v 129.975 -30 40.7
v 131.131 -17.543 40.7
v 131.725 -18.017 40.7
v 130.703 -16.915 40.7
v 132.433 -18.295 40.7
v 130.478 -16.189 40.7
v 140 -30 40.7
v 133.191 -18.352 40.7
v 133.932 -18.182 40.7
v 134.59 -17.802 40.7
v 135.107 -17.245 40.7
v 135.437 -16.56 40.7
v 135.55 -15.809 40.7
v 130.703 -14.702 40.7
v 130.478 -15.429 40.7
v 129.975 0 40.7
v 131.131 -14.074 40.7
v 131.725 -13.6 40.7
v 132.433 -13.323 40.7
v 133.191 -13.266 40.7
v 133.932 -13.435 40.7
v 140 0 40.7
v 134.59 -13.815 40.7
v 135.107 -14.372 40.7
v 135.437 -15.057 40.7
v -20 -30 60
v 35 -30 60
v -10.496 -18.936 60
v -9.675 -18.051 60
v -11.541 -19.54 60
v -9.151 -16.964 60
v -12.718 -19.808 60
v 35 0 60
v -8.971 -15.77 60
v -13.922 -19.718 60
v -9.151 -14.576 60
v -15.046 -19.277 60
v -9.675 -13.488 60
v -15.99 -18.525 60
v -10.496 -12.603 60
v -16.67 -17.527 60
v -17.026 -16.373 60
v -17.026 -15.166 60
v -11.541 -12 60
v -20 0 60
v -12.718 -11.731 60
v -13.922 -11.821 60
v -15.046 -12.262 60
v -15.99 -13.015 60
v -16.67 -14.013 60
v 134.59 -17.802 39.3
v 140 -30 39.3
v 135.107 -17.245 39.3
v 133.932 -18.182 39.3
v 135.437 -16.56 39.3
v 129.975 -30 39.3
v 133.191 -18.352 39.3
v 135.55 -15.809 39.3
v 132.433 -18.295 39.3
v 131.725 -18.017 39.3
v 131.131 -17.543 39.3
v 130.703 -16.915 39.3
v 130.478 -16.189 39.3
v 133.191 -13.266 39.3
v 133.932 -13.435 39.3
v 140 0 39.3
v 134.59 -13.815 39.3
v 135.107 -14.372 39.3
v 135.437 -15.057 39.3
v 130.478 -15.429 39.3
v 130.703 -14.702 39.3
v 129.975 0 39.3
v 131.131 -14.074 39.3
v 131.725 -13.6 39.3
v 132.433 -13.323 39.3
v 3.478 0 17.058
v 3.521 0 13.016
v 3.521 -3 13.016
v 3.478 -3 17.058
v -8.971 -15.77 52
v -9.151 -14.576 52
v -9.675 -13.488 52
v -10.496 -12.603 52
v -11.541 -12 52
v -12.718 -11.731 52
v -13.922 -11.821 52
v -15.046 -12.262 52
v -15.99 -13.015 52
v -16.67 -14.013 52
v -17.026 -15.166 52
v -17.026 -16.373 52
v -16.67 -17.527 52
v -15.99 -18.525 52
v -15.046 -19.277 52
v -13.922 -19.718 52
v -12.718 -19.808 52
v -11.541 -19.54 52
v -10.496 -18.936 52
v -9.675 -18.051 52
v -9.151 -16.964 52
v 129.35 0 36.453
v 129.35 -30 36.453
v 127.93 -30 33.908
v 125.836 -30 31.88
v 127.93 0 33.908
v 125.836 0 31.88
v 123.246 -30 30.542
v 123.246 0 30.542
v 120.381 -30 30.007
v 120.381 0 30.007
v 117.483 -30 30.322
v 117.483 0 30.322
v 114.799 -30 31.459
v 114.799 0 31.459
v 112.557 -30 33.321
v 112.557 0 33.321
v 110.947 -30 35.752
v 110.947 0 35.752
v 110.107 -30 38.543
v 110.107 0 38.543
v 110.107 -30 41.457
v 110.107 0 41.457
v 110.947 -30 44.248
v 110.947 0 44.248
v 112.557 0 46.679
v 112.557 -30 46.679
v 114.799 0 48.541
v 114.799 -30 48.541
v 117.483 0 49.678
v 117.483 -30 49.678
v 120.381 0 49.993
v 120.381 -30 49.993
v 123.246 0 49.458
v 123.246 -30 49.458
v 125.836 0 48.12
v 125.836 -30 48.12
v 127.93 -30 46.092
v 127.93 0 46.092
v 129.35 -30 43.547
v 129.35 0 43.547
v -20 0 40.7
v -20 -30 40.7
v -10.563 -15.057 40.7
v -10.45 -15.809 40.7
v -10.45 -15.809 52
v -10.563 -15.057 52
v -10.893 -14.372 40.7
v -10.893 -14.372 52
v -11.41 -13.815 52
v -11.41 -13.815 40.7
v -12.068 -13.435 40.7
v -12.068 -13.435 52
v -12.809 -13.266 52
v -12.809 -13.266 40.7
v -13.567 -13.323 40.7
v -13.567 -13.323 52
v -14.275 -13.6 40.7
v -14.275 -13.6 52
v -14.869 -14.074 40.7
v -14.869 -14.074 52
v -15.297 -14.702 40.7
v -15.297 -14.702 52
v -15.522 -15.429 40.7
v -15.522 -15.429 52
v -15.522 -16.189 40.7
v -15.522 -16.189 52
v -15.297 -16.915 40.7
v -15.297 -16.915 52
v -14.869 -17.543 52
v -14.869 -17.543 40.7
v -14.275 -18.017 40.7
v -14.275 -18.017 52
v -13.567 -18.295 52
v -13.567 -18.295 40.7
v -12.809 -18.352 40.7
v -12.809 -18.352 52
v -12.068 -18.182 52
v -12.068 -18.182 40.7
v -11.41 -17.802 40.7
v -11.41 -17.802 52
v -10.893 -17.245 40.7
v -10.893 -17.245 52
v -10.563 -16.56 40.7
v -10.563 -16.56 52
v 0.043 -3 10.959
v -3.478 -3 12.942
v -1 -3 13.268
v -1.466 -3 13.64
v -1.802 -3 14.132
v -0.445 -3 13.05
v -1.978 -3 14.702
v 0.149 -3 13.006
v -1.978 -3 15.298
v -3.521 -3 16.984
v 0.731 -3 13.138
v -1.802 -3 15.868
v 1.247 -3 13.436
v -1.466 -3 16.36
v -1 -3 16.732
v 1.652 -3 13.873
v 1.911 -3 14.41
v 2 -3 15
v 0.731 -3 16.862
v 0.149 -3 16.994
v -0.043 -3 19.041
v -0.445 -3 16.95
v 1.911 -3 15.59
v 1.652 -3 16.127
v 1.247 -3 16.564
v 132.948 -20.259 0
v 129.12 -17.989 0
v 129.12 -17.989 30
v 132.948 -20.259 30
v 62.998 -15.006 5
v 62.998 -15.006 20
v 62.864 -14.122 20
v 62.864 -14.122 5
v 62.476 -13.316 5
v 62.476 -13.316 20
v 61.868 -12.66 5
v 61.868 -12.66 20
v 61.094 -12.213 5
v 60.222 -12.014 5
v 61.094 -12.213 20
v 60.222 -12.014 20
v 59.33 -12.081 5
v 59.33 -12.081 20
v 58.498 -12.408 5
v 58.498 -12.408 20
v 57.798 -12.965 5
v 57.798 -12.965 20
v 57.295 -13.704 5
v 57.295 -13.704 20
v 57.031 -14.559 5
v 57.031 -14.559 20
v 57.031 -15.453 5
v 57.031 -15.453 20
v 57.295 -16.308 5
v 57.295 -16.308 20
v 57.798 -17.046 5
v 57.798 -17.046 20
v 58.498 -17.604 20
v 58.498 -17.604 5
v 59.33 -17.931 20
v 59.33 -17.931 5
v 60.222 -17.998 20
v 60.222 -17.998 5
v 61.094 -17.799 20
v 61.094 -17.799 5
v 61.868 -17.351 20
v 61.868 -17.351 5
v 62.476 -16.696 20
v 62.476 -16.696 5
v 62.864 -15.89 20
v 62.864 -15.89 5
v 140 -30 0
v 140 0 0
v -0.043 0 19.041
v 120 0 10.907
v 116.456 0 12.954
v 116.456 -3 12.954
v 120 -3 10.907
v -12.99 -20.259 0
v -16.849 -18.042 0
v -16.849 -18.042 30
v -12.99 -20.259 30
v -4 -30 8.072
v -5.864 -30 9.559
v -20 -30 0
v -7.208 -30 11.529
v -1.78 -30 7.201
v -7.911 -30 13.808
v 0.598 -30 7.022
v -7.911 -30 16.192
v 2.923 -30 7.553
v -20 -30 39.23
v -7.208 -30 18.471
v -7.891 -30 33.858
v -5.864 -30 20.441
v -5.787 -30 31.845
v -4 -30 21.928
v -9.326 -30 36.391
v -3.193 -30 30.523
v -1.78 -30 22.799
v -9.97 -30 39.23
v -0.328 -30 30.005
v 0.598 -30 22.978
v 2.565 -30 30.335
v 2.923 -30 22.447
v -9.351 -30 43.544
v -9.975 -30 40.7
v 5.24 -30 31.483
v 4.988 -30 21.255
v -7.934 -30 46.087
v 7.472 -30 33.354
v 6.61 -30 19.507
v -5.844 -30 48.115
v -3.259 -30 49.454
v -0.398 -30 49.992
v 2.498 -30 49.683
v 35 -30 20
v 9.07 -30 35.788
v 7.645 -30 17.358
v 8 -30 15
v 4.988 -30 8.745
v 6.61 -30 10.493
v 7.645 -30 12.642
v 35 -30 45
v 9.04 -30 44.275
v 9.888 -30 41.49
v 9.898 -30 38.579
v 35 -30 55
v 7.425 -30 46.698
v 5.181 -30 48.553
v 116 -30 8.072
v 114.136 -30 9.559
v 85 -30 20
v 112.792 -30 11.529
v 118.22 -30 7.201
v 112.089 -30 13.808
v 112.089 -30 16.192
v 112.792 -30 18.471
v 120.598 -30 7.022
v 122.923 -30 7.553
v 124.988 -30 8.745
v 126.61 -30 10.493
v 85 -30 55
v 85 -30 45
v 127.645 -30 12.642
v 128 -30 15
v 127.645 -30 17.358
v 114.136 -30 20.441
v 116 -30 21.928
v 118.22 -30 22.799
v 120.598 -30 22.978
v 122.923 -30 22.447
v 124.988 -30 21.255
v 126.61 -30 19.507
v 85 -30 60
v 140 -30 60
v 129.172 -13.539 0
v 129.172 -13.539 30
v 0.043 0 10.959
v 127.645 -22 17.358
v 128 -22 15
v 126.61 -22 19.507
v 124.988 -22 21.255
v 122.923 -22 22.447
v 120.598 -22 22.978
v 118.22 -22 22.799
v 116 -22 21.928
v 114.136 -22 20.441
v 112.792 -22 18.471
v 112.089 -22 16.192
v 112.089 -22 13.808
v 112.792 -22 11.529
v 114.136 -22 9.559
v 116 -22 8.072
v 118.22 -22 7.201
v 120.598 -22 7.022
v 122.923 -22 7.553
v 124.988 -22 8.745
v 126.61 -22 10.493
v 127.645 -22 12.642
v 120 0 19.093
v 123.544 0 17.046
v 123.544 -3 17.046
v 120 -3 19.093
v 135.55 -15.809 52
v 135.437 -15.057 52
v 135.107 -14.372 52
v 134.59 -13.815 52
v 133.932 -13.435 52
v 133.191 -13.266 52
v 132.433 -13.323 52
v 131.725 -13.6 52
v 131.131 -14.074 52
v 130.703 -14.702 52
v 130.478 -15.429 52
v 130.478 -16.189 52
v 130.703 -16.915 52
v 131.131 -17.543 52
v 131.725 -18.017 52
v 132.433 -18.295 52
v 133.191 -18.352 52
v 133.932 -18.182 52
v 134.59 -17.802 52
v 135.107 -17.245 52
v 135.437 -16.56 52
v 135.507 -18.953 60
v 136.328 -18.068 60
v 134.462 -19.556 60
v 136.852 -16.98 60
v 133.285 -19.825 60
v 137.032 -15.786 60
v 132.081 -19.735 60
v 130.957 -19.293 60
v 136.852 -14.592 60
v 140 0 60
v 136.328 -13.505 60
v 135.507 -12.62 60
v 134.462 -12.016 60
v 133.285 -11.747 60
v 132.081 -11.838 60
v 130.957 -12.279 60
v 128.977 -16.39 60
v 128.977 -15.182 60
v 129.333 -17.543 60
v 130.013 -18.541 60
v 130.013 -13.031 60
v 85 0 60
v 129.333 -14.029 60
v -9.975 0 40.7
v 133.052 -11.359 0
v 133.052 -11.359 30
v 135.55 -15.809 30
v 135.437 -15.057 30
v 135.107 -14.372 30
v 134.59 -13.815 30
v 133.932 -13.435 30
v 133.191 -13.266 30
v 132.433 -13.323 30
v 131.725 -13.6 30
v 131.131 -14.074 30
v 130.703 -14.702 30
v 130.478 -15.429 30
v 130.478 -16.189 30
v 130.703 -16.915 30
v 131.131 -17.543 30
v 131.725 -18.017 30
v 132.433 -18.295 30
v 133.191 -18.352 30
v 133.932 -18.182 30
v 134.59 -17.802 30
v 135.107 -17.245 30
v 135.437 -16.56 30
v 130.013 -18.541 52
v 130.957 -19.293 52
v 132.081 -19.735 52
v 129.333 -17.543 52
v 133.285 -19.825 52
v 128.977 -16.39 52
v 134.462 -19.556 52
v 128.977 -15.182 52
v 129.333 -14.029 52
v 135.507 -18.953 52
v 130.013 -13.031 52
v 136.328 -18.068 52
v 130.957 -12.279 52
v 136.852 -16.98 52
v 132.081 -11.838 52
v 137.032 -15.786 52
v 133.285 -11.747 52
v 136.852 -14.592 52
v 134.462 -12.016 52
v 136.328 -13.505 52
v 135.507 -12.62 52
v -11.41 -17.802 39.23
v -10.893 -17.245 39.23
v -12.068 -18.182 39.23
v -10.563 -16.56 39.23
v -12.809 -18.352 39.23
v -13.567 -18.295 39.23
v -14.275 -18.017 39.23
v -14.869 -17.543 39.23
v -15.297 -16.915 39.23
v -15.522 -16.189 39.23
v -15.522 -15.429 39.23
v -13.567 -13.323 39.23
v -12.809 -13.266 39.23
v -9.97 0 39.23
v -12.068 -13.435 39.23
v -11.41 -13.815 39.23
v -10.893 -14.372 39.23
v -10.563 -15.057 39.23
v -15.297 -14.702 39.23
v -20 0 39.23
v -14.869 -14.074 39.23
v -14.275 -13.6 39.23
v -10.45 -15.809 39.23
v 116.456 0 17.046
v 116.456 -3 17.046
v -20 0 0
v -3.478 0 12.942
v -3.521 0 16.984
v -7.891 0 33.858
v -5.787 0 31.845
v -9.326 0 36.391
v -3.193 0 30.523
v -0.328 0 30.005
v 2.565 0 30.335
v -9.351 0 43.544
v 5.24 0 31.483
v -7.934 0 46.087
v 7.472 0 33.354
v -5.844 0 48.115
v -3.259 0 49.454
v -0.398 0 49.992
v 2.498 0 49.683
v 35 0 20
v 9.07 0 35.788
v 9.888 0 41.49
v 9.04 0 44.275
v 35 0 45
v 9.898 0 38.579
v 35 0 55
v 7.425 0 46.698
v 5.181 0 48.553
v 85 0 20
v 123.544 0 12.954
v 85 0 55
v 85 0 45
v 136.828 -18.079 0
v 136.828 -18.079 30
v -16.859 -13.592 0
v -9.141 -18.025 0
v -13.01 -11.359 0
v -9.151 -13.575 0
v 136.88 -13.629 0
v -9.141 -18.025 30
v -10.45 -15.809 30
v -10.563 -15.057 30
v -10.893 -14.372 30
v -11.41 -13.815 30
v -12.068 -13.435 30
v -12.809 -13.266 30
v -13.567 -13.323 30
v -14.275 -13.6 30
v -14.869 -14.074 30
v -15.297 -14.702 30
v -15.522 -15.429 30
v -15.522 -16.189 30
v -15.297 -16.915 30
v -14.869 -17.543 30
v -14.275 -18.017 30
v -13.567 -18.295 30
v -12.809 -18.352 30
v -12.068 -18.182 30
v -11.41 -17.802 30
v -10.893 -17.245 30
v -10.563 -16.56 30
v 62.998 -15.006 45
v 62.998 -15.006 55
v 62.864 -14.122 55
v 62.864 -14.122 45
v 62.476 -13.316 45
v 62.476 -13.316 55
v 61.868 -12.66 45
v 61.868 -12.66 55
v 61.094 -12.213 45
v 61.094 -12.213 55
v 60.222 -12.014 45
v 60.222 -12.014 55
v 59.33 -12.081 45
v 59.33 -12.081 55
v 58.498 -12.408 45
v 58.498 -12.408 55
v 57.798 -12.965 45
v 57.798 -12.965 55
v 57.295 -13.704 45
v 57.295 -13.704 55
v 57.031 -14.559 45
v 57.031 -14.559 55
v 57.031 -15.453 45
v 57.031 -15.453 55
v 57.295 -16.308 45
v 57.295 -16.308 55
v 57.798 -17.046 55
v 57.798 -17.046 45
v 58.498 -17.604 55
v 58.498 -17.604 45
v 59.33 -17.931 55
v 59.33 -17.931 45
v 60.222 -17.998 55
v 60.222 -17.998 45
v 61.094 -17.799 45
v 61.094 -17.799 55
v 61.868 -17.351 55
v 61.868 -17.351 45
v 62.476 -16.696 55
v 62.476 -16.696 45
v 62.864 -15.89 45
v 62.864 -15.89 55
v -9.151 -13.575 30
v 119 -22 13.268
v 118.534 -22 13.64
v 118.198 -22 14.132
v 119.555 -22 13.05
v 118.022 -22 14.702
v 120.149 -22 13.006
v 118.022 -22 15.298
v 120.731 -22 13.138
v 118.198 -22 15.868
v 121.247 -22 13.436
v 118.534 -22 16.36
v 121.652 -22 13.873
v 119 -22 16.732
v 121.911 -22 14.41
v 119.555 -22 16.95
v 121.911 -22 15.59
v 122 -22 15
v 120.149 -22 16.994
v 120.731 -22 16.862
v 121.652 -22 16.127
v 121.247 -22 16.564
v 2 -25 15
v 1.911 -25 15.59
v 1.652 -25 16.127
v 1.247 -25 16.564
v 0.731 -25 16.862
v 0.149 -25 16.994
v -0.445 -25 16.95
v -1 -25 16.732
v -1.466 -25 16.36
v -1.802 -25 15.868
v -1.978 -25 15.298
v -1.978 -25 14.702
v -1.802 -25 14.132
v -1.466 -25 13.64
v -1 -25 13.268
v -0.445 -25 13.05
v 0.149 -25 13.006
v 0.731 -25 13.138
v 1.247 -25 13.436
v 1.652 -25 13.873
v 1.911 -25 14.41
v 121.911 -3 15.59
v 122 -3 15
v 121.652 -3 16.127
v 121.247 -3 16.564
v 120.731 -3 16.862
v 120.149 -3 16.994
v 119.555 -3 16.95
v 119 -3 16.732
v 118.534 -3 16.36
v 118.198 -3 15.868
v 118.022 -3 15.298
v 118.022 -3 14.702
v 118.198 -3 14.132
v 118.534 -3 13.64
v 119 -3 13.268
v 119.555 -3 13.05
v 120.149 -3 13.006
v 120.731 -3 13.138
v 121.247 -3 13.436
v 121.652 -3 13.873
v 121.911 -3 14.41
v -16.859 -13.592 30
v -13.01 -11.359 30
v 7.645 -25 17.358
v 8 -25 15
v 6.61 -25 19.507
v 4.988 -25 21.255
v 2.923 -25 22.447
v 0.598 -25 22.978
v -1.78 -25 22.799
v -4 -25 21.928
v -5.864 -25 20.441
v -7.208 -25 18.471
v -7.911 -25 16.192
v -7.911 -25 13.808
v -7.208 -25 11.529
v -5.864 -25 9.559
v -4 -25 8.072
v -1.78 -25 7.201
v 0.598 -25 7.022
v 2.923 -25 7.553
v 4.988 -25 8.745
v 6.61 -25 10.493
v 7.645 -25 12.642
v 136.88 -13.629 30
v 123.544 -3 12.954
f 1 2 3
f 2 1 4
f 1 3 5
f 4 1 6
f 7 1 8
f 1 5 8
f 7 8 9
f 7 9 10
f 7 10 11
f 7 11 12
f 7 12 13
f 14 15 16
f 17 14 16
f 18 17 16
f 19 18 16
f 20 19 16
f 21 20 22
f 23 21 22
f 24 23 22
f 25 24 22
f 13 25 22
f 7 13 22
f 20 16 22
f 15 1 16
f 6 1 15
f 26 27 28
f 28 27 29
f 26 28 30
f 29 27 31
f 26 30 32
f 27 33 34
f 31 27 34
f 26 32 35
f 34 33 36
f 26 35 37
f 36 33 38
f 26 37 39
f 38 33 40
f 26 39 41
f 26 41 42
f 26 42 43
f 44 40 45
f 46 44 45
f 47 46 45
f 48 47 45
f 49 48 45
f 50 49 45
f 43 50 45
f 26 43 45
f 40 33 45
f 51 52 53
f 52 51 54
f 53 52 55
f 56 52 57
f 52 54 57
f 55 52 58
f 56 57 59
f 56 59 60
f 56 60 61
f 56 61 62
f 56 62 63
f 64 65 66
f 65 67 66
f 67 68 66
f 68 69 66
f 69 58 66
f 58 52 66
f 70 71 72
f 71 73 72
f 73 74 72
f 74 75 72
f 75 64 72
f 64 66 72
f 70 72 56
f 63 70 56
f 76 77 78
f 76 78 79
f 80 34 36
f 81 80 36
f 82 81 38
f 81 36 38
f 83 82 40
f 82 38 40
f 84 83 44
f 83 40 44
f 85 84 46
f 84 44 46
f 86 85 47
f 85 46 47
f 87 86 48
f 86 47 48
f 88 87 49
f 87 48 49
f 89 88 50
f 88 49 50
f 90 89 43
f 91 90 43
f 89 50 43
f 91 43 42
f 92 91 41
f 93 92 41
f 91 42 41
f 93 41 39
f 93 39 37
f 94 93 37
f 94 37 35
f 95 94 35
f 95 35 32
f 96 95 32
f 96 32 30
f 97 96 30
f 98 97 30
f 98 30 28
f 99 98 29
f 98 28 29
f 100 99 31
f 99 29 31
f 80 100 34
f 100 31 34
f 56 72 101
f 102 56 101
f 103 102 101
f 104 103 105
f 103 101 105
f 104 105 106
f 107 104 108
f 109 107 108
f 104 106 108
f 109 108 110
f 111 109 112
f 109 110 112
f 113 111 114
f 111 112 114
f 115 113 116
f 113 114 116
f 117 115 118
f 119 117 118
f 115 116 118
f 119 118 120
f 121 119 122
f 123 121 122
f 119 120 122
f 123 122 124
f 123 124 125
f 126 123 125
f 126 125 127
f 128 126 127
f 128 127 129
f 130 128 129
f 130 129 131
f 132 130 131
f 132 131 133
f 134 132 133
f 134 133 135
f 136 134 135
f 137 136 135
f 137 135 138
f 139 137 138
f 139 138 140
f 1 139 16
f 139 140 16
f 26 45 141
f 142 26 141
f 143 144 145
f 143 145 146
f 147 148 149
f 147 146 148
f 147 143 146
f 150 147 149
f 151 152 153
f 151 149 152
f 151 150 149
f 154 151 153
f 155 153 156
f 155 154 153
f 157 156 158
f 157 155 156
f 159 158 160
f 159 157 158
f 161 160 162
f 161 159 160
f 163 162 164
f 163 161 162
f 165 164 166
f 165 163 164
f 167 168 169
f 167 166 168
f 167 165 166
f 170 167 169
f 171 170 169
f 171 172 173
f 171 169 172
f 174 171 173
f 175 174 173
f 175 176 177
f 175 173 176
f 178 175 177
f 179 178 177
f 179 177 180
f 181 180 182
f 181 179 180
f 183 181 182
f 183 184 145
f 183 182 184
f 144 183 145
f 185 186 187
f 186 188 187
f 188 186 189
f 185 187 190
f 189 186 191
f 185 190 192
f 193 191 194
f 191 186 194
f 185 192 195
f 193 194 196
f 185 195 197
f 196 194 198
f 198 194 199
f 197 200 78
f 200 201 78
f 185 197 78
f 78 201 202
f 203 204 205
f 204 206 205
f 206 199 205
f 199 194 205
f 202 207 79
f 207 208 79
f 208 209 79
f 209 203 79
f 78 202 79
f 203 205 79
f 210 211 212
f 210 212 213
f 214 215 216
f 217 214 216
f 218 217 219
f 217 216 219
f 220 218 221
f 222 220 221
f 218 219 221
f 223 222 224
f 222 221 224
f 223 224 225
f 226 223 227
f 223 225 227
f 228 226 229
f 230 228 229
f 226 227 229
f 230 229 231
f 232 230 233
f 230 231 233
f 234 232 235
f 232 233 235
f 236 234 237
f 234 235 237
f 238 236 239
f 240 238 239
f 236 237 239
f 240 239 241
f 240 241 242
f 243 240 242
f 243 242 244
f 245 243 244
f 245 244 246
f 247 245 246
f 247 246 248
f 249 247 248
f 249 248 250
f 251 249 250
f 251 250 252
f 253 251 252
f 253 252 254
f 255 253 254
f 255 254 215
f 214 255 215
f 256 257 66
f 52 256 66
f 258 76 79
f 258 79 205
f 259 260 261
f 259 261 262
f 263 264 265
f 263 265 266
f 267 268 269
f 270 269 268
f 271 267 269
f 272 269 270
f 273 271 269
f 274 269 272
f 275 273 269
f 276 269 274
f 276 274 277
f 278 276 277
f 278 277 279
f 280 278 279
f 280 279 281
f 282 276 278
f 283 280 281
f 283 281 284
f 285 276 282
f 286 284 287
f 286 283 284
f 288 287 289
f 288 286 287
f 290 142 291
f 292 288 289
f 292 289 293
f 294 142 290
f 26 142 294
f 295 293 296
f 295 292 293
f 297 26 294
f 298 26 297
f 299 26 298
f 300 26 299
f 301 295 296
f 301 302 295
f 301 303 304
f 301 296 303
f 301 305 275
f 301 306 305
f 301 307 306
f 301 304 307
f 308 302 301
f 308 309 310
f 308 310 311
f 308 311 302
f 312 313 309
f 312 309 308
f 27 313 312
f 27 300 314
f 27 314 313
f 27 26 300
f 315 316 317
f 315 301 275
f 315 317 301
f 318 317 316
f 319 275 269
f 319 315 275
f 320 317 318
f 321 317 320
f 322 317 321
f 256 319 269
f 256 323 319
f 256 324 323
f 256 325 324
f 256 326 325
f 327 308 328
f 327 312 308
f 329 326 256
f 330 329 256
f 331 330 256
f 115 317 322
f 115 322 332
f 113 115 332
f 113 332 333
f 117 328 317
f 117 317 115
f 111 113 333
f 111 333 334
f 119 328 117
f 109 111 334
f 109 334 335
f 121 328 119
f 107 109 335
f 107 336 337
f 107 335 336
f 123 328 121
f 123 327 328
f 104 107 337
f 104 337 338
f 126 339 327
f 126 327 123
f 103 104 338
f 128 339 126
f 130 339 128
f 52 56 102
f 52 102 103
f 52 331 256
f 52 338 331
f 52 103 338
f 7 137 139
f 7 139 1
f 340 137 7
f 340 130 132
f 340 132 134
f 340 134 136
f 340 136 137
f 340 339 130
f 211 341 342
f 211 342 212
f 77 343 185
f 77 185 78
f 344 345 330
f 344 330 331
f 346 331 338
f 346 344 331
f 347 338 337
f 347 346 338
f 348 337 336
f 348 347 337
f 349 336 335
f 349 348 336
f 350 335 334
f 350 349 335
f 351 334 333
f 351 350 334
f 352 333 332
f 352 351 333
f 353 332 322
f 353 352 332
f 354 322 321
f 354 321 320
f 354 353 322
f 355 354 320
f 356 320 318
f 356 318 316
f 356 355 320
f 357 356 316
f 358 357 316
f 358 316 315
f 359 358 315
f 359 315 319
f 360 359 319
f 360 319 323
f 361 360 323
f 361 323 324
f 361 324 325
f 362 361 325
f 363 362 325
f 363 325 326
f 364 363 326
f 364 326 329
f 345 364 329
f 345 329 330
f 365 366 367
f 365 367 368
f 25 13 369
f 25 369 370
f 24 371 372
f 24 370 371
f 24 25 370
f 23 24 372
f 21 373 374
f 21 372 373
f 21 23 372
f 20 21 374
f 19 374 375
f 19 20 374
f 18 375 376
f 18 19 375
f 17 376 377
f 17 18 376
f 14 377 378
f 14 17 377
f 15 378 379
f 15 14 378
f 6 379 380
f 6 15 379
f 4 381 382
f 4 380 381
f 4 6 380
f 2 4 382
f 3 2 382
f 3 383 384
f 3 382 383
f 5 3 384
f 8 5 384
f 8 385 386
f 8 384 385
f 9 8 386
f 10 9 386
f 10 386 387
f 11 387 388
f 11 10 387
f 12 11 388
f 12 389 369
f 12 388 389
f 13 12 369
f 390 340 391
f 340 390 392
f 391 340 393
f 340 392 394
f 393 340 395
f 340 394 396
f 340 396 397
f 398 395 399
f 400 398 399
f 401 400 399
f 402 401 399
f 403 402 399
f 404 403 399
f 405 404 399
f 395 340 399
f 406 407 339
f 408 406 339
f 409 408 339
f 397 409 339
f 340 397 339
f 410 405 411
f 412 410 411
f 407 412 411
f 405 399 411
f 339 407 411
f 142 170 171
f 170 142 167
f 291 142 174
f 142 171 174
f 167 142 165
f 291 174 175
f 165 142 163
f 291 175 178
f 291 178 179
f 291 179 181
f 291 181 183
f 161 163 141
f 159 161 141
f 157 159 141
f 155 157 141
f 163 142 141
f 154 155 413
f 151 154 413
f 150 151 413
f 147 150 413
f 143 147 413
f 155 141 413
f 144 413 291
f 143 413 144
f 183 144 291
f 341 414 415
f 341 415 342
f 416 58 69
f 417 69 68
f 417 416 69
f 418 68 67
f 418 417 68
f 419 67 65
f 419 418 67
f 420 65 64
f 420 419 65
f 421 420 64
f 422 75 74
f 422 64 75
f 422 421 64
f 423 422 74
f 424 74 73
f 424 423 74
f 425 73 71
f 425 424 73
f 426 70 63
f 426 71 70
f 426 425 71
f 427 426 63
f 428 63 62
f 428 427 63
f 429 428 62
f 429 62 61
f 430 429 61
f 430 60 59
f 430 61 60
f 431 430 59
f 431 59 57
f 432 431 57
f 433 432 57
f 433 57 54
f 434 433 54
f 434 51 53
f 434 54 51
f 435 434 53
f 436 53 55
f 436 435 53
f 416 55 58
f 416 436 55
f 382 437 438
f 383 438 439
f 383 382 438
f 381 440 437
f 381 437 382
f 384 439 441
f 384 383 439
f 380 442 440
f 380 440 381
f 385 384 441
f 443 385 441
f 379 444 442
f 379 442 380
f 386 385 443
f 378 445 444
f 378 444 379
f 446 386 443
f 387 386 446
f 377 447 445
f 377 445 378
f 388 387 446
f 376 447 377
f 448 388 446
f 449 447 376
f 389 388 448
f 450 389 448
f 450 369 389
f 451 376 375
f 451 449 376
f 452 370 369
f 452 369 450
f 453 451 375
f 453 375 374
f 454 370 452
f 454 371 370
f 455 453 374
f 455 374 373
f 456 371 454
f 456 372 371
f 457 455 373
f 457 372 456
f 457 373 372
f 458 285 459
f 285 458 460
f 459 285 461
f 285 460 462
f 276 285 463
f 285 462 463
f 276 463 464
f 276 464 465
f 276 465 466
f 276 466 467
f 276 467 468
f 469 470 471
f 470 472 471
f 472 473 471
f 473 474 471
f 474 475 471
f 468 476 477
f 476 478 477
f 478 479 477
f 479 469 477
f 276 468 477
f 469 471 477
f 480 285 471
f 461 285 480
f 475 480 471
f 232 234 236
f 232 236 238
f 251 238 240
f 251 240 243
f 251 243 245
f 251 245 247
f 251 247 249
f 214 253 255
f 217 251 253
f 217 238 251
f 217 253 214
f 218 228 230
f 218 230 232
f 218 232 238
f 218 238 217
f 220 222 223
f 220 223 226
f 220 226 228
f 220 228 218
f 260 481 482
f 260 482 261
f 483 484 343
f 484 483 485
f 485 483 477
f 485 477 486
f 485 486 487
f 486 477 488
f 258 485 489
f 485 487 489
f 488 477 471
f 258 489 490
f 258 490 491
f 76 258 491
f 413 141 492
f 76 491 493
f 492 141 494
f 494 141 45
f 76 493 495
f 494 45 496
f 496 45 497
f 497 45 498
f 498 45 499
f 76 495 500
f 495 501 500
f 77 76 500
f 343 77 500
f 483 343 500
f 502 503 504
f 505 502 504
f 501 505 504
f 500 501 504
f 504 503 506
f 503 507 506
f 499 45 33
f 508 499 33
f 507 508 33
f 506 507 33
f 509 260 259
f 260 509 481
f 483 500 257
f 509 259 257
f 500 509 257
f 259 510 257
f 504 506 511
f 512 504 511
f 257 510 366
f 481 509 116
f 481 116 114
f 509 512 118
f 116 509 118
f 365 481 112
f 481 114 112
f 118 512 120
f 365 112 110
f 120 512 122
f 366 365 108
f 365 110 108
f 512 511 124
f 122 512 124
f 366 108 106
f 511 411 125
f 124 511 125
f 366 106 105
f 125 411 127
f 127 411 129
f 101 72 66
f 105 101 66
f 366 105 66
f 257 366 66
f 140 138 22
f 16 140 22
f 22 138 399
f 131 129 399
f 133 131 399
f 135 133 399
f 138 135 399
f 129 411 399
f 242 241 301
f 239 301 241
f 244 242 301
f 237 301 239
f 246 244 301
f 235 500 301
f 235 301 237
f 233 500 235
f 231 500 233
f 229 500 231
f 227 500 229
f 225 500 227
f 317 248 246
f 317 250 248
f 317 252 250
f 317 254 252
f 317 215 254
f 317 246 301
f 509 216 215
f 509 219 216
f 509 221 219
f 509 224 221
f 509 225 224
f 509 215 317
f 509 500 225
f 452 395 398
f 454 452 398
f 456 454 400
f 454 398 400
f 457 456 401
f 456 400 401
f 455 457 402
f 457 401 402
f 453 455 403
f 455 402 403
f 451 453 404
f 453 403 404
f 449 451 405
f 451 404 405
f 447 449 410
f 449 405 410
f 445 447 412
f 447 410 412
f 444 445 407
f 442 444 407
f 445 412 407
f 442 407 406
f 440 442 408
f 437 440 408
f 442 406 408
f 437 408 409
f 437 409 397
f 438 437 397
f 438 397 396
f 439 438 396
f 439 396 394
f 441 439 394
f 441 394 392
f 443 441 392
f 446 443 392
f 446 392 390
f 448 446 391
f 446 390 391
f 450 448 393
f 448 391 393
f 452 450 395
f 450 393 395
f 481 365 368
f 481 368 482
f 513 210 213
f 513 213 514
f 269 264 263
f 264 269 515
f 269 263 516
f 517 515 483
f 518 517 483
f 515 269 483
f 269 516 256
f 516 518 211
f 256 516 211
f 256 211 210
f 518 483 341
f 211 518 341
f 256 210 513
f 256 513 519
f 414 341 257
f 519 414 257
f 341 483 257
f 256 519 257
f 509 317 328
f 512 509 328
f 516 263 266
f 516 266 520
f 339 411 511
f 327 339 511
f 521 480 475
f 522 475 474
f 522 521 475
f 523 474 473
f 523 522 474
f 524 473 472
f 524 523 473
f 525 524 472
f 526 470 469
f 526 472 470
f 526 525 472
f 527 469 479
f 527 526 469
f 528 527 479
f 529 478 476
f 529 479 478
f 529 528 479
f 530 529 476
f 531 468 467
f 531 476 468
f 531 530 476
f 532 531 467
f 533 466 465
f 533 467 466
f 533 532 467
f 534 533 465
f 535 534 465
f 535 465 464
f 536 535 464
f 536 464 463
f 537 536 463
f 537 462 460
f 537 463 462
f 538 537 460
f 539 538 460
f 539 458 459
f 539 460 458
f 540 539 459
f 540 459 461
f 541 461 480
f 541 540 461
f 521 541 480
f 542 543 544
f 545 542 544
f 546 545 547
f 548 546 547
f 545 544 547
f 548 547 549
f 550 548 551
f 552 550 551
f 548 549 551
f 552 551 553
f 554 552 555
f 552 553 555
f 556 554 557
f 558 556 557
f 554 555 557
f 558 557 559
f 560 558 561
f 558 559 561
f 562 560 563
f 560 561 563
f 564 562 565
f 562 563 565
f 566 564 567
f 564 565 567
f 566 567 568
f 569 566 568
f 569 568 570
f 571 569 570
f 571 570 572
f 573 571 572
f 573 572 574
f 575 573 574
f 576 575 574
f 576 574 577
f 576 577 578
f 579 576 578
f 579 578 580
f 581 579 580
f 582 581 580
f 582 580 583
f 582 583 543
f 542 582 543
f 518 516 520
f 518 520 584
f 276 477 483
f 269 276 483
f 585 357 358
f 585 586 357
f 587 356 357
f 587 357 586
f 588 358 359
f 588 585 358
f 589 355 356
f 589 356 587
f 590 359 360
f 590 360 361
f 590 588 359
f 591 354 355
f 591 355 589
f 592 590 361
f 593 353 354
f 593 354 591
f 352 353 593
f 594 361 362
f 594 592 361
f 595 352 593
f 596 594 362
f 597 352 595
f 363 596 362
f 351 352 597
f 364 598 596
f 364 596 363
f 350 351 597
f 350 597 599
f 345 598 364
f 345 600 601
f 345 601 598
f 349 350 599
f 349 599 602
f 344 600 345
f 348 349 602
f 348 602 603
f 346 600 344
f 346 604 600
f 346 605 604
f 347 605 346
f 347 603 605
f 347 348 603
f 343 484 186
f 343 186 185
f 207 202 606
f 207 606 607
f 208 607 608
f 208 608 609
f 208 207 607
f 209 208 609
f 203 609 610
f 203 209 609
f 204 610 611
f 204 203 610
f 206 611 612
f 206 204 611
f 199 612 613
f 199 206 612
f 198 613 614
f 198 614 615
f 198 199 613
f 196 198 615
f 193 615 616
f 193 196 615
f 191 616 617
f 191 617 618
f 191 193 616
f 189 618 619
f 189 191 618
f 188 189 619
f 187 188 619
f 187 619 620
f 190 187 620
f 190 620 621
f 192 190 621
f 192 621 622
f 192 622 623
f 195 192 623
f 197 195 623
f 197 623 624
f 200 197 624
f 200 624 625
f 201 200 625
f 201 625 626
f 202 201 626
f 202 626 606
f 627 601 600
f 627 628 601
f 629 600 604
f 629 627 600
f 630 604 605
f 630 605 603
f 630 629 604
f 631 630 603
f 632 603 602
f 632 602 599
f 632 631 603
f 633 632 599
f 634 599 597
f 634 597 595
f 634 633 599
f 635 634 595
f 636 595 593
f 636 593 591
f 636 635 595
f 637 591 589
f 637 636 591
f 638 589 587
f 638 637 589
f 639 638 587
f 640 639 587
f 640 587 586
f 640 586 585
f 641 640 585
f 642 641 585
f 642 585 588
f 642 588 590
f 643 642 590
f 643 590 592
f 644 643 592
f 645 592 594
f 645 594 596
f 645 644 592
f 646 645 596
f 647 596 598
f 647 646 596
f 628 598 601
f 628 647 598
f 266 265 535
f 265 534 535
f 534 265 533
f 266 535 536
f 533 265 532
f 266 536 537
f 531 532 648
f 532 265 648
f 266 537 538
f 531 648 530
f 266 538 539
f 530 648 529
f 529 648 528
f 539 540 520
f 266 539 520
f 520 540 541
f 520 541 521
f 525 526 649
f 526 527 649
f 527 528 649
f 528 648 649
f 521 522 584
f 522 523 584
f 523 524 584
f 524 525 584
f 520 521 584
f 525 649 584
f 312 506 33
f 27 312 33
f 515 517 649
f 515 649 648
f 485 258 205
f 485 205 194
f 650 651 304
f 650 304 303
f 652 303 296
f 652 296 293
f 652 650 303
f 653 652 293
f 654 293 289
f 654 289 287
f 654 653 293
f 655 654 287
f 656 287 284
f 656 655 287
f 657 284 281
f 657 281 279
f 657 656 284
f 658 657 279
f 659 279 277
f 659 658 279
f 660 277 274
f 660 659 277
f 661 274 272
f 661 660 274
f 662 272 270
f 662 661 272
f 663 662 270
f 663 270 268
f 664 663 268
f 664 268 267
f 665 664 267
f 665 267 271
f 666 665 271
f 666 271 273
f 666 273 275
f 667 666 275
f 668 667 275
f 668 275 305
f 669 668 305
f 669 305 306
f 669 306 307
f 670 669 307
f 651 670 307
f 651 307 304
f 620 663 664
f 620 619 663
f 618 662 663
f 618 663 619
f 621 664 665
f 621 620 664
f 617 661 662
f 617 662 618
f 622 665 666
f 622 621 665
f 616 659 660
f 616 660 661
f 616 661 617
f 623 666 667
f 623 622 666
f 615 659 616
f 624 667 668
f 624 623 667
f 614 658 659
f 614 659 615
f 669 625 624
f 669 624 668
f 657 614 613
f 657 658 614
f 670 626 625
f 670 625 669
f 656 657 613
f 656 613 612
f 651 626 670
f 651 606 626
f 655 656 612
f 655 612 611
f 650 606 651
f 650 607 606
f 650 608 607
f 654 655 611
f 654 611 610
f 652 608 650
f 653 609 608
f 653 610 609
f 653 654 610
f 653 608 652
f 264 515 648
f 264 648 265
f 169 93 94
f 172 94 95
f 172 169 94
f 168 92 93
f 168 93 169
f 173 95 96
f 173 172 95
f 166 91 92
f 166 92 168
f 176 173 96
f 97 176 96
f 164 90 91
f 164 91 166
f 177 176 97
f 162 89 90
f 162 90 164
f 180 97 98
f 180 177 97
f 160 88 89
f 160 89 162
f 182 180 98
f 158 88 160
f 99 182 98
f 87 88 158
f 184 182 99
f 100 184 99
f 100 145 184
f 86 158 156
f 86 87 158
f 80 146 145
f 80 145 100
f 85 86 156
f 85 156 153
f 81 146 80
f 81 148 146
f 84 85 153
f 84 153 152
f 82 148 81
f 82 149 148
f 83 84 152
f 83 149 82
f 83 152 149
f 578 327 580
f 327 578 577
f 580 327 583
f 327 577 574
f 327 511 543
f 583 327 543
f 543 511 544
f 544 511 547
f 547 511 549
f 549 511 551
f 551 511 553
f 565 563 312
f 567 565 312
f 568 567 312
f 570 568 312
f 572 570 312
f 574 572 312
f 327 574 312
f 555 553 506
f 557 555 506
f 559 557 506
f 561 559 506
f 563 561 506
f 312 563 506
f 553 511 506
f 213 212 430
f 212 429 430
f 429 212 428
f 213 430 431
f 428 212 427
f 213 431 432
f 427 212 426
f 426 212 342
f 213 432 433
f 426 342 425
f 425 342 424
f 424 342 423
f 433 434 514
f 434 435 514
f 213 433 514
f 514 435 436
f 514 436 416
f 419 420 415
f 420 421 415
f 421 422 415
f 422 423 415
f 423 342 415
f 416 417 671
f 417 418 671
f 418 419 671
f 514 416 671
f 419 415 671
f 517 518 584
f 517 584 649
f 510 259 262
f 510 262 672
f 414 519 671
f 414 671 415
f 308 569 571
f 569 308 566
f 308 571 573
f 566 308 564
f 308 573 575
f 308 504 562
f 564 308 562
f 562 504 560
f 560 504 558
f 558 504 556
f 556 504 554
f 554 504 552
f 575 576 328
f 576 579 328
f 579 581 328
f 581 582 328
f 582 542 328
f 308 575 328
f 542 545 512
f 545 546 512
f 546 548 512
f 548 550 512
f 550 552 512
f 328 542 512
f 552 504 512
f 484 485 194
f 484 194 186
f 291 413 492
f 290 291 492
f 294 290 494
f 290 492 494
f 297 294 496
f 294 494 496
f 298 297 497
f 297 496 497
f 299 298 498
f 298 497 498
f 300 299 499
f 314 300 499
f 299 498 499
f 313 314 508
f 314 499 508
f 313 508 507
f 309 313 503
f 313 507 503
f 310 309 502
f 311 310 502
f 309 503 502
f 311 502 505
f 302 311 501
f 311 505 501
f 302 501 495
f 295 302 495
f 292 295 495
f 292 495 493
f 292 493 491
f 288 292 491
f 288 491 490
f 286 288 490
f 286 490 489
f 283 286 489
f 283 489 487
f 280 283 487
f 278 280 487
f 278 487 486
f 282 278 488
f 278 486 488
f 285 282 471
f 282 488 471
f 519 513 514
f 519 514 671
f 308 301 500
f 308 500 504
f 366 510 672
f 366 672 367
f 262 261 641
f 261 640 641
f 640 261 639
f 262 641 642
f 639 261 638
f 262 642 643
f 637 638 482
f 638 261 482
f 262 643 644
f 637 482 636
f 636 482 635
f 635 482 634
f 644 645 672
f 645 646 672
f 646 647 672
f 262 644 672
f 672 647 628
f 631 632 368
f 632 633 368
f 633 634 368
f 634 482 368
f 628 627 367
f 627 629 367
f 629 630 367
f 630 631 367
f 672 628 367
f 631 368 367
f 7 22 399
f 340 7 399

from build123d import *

# Parameters (mm, degrees)
F0_R      = 8
F0_W      = 50
F0_H      = 25
F1_DEPTH  = 30
F0_R_2    = 2
F2_R      = 2.55
F3_DEPTH  = 60
F5_DEPTH  = 30
F6_R      = 4.8374407279
F6_R_2    = 4.05
F7_DEPTH  = 8
F4_R      = 3.025
F8_DEPTH  = 55
F9_DEPTH  = 22
F10_DEPTH = 4
F11_DEPTH = 3
F12_DEPTH = 3
F13_DEPTH = 3
F14_DEPTH = 25
F15_DEPTH = 5
F16_DEPTH = 14.25
F17_DEPTH = 6.25
F19_R     = 3
F20_DEPTH = 50
F22_R     = 4.05
F23_DEPTH = 8


with BuildPart() as f1:
    # F0 (on Front) → F1 (new body)
    with BuildSketch(Plane.XZ):
        with BuildLine():
            Line((-20, 39.2304982366), (-20, 0))
            Line((-20, 0), (140, 0))
            Line((140, 0), (140, 39.3))
            Line((140, 39.3), (129.9754699137, 39.3))
            ThreePointArc((129.9754699137, 39.3), (110, 40), (129.9754699137, 40.7))
            Line((129.9754699137, 40.7), (140, 40.7))
            Line((140, 40.7), (140, 60))
            Line((140, 60), (85, 60))
            Line((85, 60), (85, 55))
            Line((85, 55), (35, 55))
            Line((35, 55), (35, 60))
            Line((35, 60), (-20, 60))
            Line((-20, 60), (-20, 40.7))
            Line((-20, 40.7), (-9.9754699137, 40.7))
            ThreePointArc((-9.9754699137, 40.7), (9.9999392909, 40.0348450672), (-9.9703493939, 39.2304982366))
            Line((-9.9703493939, 39.2304982366), (-20, 39.2304982366))
        make_face()
        with Locations((0, 15)):
            Circle(F0_R, mode=Mode.SUBTRACT)
        with Locations((120, 15)):
            Circle(F0_R, mode=Mode.SUBTRACT)
        with Locations((60, 32.5)):
            Rectangle(F0_W, F0_H, mode=Mode.SUBTRACT)
    extrude(amount=F1_DEPTH)

    # F2 (on Top) → F3 (cut)
    with BuildSketch(Plane.XY):
        with Locations((-13, -15.8086940646)):
            Circle(F2_R)
        with Locations((133, -15.8086940646)):
            Circle(F2_R)
    extrude(amount=F3_DEPTH, mode=Mode.SUBTRACT)

    # F2 (on Top) → F5 (cut)
    with BuildSketch(Plane.XY):
        Polygon((-16.8588337506, -13.5924129261), (-16.8487726432, -18.0424015523), (-12.9899388926, -20.2586826909), (-9.1411662494, -18.0249752032), (-9.1512273568, -13.5749865769), (-13.0100611074, -11.3587054383), align=None)
        with Locations((-13, -15.8086940646)):
            Circle(F2_R, mode=Mode.SUBTRACT)
        Polygon((129.1722717067, -13.5385139461), (129.1201021996, -17.9885139461), (132.9478304928, -20.2586940646), (136.8277282933, -18.0788741831), (136.8798978004, -13.6288741831), (133.0521695072, -11.3586940646), align=None)
        with Locations((133, -15.8086940646)):
            Circle(F2_R, mode=Mode.SUBTRACT)
    extrude(amount=F5_DEPTH, mode=Mode.SUBTRACT)

    # F6 (on Top) → F7 (cut)
    with BuildSketch(Plane.XY):
        with Locations((-13, -15.8086940646)):
            Circle(F6_R)
        with Locations((133, -15.8086940646)):
            Circle(F6_R_2)
    extrude(amount=-F7_DEPTH, mode=Mode.SUBTRACT)

    # F4 (on Top) → F8 (cut)
    with BuildSketch(Plane.XY):
        with Locations((60, -15)):
            Circle(F4_R)
    extrude(amount=-F8_DEPTH, mode=Mode.SUBTRACT)



with BuildPart() as f1b:
    # F0 (on Front) → F1, piece 2 (new body)
    with BuildSketch(Plane.XZ):
        Polygon((-0.0428018717, 19.0412252267), (-3.5212046446, 16.9835451052), (-3.4784027729, 12.9423198784), (0.0428018717, 10.9587747733), (3.5212046446, 13.0164548948), (3.4784027729, 17.0576801216), align=None)
        with Locations((0, 15)):
            Circle(F0_R_2, mode=Mode.SUBTRACT)
    extrude(amount=F1_DEPTH)


with BuildPart() as f1c:
    # F0 (on Front) → F1, piece 3 (new body)
    with BuildSketch(Plane.XZ):
        Polygon((116.4556220174, 17.0463475824), (116.4556220174, 12.9536524176), (120, 10.9073048353), (123.5443779826, 12.9536524176), (123.5443779826, 17.0463475824), (120, 19.0926951647), align=None)
        with Locations((120, 15)):
            Circle(F0_R_2, mode=Mode.SUBTRACT)
    extrude(amount=F1_DEPTH)


with BuildPart() as f1_1:
    add(f1.part)

    add(f1b.part)  # F9 merges F1b

    add(f1c.part)  # F9 merges F1c
    # F0 (on Front) → F9 (join)
    with BuildSketch(Plane.XZ):
        with Locations((0, 15)):
            Circle(F0_R)
        Polygon((-3.4784027729, 12.9423198784), (-3.5212046446, 16.9835451052), (-0.0428018717, 19.0412252267), (3.4784027729, 17.0576801216), (3.5212046446, 13.0164548948), (0.0428018717, 10.9587747733), align=None, mode=Mode.SUBTRACT)
        with Locations((120, 15)):
            Circle(F0_R)
        Polygon((120, 10.9073048353), (116.4556220174, 12.9536524176), (116.4556220174, 17.0463475824), (120, 19.0926951647), (123.5443779826, 17.0463475824), (123.5443779826, 12.9536524176), align=None, mode=Mode.SUBTRACT)
    extrude(amount=F9_DEPTH)

    # F0 (on Front) → F10 (cut)
    with BuildSketch(Plane.XZ):
        Polygon((116.4556220174, 17.0463475824), (116.4556220174, 12.9536524176), (120, 10.9073048353), (123.5443779826, 12.9536524176), (123.5443779826, 17.0463475824), (120, 19.0926951647), align=None)
        with Locations((120, 15)):
            Circle(F0_R_2, mode=Mode.SUBTRACT)
    extrude(amount=-F10_DEPTH, mode=Mode.SUBTRACT)

    # F0 (on Front) → F11 (cut)
    with BuildSketch(Plane.XZ):
        Polygon((116.4556220174, 17.0463475824), (116.4556220174, 12.9536524176), (120, 10.9073048353), (123.5443779826, 12.9536524176), (123.5443779826, 17.0463475824), (120, 19.0926951647), align=None)
        with Locations((120, 15)):
            Circle(F0_R_2, mode=Mode.SUBTRACT)
    extrude(amount=-F11_DEPTH, mode=Mode.SUBTRACT)

    # F0 (on Front) → F12 (cut)
    with BuildSketch(Plane.XZ):
        Polygon((116.4556220174, 17.0463475824), (116.4556220174, 12.9536524176), (120, 10.9073048353), (123.5443779826, 12.9536524176), (123.5443779826, 17.0463475824), (120, 19.0926951647), align=None)
        with Locations((120, 15)):
            Circle(F0_R_2, mode=Mode.SUBTRACT)
    extrude(amount=F12_DEPTH, mode=Mode.SUBTRACT)

    # F0 (on Front) → F13 (cut)
    with BuildSketch(Plane.XZ):
        Polygon((-0.0428018717, 19.0412252267), (-3.5212046446, 16.9835451052), (-3.4784027729, 12.9423198784), (0.0428018717, 10.9587747733), (3.5212046446, 13.0164548948), (3.4784027729, 17.0576801216), align=None)
        with Locations((0, 15)):
            Circle(F0_R_2, mode=Mode.SUBTRACT)
    extrude(amount=F13_DEPTH, mode=Mode.SUBTRACT)

    # F0 (on Front) → F14 (join)
    with BuildSketch(Plane.XZ):
        with Locations((0, 15)):
            Circle(F0_R)
        Polygon((-3.4784027729, 12.9423198784), (-3.5212046446, 16.9835451052), (-0.0428018717, 19.0412252267), (3.4784027729, 17.0576801216), (3.5212046446, 13.0164548948), (0.0428018717, 10.9587747733), align=None, mode=Mode.SUBTRACT)
    extrude(amount=F14_DEPTH)

    # F15 (cut): a face of the model
    f15_faces = [f1_1.faces().sort_by_distance(p)[0] for p in [
        (1.6651859594, -30, 17.9560510216),
    ]]
    extrude(f15_faces, amount=-F15_DEPTH, mode=Mode.SUBTRACT)

    # F16 (cut): a face of the model
    f16_faces = [f1_1.faces().sort_by_distance(p)[0] for p in [
        (116.5639045534, -30, 15),
    ]]
    extrude(f16_faces, amount=-F16_DEPTH, mode=Mode.SUBTRACT)

    # F17 (add, through all): a face of the model
    f17_faces = [f1_1.faces().sort_by_distance(p)[0] for p in [
        (116.5639045534, -15.75, 15),
    ]]
    extrude(f17_faces, amount=F17_DEPTH)

    # F19 (on offset) → F20 (cut)
    with BuildSketch(Plane.XY.offset(55)):
        with Locations((59.9975660443, -15.0059489533)):
            Circle(F19_R)
    extrude(amount=-F20_DEPTH, mode=Mode.SUBTRACT)

    # F22 (on offset) → F23 (cut)
    with BuildSketch(Plane.XY.offset(60)):
        with Locations((-13.0209773779, -15.7698076218)):
            Circle(F22_R)
        with Locations((132.9820901155, -15.7860927284)):
            Circle(F22_R)
    extrude(amount=-F23_DEPTH, mode=Mode.SUBTRACT)


solid = f1_1.part
